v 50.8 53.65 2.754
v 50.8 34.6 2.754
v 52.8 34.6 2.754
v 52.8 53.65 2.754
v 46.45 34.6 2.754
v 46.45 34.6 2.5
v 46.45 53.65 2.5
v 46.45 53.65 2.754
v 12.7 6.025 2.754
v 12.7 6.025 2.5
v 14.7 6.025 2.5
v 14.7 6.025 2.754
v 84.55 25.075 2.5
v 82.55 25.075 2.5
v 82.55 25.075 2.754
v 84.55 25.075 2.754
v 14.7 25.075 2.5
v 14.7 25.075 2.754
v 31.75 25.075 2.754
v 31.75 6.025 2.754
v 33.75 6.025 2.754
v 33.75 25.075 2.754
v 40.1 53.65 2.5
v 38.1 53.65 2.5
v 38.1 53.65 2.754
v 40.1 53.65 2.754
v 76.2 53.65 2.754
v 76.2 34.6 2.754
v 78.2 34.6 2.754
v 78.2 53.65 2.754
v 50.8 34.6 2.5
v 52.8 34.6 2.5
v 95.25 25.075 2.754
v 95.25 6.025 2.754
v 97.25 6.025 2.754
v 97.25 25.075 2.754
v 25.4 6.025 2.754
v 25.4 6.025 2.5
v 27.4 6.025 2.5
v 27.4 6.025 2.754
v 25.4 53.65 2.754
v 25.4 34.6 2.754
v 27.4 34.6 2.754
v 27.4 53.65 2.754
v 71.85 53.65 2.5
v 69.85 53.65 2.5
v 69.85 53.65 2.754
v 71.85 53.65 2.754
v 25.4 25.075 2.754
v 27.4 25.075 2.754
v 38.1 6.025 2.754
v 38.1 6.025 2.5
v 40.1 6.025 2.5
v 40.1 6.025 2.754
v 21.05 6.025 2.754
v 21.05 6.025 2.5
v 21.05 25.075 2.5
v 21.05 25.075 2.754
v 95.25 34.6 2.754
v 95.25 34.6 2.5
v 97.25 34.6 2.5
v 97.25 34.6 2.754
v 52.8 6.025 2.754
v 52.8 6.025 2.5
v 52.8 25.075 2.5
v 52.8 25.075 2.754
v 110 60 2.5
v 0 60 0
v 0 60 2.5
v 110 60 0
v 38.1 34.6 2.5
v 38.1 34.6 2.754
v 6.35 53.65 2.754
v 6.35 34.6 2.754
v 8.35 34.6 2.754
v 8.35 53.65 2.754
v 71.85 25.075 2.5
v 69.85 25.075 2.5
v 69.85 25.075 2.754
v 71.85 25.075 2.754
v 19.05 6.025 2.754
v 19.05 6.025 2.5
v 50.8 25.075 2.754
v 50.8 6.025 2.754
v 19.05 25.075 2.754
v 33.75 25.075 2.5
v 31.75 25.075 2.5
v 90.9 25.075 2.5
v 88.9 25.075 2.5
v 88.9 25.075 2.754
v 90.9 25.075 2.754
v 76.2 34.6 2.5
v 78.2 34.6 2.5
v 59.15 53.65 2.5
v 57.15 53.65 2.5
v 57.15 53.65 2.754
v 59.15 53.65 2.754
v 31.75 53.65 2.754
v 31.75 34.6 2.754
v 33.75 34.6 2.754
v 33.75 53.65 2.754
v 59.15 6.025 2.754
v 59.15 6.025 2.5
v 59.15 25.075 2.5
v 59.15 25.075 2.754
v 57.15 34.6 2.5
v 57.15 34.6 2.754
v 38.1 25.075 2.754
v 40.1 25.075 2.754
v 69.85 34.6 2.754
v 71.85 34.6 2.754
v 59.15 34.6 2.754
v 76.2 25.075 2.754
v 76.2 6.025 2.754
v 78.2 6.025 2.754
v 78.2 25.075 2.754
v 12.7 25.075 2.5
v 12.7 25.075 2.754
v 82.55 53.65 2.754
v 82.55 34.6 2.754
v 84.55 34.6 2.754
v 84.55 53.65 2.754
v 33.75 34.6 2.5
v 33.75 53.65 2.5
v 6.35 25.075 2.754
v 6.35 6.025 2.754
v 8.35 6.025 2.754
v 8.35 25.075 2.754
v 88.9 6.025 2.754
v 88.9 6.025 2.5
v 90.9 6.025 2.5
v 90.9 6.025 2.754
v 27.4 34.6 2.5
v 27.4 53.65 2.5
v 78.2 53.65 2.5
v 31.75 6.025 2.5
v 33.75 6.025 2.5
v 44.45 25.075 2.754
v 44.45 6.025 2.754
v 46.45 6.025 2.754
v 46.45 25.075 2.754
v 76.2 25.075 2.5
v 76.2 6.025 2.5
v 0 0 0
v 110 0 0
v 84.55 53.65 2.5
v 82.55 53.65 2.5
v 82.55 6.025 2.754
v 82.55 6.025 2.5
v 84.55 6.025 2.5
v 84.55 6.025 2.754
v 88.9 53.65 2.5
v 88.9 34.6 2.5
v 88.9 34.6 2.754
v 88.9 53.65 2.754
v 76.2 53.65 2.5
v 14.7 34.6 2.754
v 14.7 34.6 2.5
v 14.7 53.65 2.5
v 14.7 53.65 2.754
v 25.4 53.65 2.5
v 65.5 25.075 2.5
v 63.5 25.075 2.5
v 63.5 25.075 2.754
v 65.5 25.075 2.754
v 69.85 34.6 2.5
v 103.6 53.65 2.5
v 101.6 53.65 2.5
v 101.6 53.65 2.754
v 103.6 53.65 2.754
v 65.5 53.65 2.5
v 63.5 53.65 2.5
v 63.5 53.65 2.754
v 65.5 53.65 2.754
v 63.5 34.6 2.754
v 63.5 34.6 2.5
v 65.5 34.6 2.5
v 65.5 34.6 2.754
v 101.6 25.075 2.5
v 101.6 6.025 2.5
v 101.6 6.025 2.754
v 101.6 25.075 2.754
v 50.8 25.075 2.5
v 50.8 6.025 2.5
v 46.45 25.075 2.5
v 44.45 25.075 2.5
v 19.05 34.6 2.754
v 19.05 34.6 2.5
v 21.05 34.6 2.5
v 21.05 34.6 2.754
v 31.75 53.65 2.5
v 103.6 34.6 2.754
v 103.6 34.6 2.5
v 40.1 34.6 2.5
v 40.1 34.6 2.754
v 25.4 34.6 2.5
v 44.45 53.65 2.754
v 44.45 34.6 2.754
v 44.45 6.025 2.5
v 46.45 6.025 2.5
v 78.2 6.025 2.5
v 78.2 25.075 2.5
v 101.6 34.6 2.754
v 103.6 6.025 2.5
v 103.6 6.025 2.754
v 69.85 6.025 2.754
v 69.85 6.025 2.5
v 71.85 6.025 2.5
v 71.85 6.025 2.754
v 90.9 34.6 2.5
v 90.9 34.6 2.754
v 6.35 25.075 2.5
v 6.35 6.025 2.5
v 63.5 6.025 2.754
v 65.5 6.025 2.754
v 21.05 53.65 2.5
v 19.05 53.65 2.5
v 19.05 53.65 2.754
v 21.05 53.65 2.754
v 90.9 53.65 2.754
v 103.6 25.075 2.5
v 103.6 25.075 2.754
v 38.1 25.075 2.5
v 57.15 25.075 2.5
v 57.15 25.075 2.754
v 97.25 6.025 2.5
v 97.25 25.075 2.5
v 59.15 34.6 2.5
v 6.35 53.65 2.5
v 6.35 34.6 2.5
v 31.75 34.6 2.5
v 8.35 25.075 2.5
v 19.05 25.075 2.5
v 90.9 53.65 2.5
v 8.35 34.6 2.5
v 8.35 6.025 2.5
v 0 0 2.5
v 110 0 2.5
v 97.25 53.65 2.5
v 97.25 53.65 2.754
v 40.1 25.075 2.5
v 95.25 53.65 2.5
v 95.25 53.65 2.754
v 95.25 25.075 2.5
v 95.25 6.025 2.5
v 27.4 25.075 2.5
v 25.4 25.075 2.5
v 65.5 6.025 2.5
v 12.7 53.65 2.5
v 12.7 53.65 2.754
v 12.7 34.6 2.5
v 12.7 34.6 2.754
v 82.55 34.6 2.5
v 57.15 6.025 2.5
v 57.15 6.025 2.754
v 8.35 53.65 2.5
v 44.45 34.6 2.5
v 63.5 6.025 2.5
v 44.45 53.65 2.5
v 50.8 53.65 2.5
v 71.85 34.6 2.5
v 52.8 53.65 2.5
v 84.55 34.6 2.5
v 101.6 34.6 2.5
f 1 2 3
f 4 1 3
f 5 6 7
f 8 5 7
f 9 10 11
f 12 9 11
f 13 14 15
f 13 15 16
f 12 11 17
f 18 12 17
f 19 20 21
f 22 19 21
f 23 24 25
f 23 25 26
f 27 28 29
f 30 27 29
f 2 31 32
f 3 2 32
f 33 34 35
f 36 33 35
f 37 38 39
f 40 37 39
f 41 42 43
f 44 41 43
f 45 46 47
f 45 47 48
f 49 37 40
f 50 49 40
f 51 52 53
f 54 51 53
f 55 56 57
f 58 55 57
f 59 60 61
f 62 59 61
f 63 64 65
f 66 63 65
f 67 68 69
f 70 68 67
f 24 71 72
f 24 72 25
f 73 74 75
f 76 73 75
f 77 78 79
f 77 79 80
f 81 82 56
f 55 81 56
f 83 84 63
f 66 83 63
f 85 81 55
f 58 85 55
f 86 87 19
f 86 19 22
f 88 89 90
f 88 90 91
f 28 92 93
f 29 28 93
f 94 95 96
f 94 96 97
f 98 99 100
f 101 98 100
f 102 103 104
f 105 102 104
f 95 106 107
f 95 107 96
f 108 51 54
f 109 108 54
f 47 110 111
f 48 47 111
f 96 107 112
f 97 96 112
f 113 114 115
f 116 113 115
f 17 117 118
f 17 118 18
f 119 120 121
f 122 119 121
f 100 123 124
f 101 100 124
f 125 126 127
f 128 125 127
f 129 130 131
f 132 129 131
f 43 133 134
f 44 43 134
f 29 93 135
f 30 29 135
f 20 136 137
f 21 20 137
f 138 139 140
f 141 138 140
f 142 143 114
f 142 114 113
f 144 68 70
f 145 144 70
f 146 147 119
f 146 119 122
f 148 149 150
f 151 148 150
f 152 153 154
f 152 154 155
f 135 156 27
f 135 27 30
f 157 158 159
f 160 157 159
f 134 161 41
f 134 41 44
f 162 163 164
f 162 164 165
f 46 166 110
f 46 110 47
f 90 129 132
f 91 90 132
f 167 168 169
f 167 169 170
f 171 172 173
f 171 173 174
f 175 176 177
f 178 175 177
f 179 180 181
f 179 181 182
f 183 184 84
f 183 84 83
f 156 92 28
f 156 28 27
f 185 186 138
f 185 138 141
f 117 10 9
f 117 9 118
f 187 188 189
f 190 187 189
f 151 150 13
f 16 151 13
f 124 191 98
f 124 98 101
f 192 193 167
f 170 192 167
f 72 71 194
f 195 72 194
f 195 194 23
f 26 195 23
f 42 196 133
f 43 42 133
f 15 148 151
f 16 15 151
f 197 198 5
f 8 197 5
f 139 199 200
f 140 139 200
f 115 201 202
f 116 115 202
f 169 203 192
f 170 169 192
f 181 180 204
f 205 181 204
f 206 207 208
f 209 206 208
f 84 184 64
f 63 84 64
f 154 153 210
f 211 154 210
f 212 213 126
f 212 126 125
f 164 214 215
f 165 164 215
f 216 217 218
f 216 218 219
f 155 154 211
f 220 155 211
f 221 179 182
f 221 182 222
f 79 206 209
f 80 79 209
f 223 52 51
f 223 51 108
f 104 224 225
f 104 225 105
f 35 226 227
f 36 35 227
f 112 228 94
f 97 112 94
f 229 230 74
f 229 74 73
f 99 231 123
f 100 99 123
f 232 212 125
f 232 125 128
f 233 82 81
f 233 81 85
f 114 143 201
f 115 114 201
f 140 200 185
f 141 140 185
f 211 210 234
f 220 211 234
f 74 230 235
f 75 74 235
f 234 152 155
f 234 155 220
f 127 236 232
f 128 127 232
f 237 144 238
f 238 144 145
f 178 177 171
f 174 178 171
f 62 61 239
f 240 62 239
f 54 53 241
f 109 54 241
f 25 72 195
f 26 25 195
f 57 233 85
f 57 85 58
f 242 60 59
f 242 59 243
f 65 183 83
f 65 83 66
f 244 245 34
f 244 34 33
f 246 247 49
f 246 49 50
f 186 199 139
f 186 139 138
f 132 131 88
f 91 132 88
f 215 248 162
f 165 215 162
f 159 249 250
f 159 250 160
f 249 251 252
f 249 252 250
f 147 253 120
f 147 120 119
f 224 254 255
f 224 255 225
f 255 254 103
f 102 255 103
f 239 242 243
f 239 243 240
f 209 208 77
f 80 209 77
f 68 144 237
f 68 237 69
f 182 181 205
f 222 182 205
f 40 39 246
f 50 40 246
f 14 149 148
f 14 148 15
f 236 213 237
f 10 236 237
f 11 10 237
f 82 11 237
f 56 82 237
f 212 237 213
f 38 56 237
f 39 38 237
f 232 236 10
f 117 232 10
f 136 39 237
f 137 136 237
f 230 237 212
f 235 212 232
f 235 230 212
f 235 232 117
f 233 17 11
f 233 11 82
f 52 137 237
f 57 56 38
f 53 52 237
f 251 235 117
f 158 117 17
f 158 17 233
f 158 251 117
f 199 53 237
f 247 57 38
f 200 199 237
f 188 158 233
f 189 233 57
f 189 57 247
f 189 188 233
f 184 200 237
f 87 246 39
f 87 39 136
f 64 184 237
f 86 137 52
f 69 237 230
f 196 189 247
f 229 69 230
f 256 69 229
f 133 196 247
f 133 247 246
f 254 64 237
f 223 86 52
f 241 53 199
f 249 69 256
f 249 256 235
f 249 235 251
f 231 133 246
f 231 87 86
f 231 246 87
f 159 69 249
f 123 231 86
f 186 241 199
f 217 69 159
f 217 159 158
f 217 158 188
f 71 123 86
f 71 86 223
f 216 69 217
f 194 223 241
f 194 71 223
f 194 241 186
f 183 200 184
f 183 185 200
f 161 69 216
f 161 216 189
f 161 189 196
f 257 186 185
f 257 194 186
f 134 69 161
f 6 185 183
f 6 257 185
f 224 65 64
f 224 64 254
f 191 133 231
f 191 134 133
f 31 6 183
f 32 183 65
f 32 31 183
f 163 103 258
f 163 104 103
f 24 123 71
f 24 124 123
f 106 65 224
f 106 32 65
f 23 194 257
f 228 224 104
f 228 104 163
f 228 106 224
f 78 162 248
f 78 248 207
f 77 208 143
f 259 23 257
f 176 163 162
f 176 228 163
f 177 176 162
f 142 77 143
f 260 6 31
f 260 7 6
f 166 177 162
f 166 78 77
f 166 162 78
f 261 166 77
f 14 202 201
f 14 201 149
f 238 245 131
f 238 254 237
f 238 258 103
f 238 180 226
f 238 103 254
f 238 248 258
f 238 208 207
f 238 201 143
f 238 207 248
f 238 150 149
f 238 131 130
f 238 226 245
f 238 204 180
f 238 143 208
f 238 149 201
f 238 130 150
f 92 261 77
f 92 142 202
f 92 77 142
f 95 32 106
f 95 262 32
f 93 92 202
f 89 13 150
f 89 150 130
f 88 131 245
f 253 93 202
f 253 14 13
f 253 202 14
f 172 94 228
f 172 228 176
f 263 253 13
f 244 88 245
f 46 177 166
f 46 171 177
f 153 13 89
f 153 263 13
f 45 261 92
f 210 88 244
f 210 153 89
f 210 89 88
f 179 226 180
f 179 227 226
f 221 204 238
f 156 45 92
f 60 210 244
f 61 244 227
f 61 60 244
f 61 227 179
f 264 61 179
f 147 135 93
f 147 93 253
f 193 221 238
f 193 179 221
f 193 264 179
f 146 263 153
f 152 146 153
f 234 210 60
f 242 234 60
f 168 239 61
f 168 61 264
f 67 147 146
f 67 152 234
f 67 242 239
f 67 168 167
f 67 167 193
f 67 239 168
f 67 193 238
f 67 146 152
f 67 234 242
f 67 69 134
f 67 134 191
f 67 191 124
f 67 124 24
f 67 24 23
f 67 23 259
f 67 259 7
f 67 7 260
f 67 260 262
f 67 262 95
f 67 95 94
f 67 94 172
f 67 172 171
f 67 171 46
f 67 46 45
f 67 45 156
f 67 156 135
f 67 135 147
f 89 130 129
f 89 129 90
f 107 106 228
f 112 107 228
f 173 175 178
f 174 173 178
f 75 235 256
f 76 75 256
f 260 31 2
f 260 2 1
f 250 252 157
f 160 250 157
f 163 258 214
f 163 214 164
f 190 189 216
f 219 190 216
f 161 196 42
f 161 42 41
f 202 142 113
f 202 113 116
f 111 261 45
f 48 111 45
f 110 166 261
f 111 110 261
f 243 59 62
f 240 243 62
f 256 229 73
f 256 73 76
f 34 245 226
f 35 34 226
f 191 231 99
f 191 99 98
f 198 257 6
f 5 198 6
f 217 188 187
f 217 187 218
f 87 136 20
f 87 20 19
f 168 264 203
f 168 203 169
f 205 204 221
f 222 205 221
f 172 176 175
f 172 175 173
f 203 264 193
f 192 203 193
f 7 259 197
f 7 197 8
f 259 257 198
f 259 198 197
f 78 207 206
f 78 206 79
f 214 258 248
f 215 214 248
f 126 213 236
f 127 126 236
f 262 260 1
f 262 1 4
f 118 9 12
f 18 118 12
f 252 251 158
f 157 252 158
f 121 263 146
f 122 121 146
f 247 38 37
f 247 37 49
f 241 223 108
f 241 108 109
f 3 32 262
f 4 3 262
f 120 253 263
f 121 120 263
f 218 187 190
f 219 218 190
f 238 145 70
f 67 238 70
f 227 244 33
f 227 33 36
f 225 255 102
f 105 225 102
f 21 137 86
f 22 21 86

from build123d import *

# Parameters (mm, degrees)
SKETCH1_W            = 110
SKETCH1_H            = 60
BOSS_EXTRUDE1_DEPTH  = 2.5
SKETCH3_W            = 2
SKETCH3_H            = 19.05
BOSS_EXTRUDE2_DEPTH  = 0.254
LPATTERN1_COUNT      = 16
LPATTERN1_PITCH      = 6.35
LPATTERN1_COUNT_DIR2 = 2
LPATTERN1_PITCH_DIR2 = 28.575


with BuildPart() as part:
    # Sketch1 → Boss-Extrude1 (new body)
    with BuildSketch(Plane.XY):
        with Locations((55, 30)):
            Rectangle(SKETCH1_W, SKETCH1_H)
    extrude(amount=BOSS_EXTRUDE1_DEPTH)

    # Sketch3 → Boss-Extrude2 (add)
    with BuildSketch(Plane.XY.offset(2.5)):
        with Locations((7.35, 44.125)):
            Rectangle(SKETCH3_W, SKETCH3_H)
    boss_extrude2 = extrude(amount=BOSS_EXTRUDE2_DEPTH)

    # LPattern1: Boss-Extrude2 16 × 2
    with Locations(*[(i * LPATTERN1_PITCH, -j * LPATTERN1_PITCH_DIR2, 0) for i in range(LPATTERN1_COUNT) for j in range(LPATTERN1_COUNT_DIR2) if (i, j) != (0, 0)]):
        add(boss_extrude2)


solid = part.part
